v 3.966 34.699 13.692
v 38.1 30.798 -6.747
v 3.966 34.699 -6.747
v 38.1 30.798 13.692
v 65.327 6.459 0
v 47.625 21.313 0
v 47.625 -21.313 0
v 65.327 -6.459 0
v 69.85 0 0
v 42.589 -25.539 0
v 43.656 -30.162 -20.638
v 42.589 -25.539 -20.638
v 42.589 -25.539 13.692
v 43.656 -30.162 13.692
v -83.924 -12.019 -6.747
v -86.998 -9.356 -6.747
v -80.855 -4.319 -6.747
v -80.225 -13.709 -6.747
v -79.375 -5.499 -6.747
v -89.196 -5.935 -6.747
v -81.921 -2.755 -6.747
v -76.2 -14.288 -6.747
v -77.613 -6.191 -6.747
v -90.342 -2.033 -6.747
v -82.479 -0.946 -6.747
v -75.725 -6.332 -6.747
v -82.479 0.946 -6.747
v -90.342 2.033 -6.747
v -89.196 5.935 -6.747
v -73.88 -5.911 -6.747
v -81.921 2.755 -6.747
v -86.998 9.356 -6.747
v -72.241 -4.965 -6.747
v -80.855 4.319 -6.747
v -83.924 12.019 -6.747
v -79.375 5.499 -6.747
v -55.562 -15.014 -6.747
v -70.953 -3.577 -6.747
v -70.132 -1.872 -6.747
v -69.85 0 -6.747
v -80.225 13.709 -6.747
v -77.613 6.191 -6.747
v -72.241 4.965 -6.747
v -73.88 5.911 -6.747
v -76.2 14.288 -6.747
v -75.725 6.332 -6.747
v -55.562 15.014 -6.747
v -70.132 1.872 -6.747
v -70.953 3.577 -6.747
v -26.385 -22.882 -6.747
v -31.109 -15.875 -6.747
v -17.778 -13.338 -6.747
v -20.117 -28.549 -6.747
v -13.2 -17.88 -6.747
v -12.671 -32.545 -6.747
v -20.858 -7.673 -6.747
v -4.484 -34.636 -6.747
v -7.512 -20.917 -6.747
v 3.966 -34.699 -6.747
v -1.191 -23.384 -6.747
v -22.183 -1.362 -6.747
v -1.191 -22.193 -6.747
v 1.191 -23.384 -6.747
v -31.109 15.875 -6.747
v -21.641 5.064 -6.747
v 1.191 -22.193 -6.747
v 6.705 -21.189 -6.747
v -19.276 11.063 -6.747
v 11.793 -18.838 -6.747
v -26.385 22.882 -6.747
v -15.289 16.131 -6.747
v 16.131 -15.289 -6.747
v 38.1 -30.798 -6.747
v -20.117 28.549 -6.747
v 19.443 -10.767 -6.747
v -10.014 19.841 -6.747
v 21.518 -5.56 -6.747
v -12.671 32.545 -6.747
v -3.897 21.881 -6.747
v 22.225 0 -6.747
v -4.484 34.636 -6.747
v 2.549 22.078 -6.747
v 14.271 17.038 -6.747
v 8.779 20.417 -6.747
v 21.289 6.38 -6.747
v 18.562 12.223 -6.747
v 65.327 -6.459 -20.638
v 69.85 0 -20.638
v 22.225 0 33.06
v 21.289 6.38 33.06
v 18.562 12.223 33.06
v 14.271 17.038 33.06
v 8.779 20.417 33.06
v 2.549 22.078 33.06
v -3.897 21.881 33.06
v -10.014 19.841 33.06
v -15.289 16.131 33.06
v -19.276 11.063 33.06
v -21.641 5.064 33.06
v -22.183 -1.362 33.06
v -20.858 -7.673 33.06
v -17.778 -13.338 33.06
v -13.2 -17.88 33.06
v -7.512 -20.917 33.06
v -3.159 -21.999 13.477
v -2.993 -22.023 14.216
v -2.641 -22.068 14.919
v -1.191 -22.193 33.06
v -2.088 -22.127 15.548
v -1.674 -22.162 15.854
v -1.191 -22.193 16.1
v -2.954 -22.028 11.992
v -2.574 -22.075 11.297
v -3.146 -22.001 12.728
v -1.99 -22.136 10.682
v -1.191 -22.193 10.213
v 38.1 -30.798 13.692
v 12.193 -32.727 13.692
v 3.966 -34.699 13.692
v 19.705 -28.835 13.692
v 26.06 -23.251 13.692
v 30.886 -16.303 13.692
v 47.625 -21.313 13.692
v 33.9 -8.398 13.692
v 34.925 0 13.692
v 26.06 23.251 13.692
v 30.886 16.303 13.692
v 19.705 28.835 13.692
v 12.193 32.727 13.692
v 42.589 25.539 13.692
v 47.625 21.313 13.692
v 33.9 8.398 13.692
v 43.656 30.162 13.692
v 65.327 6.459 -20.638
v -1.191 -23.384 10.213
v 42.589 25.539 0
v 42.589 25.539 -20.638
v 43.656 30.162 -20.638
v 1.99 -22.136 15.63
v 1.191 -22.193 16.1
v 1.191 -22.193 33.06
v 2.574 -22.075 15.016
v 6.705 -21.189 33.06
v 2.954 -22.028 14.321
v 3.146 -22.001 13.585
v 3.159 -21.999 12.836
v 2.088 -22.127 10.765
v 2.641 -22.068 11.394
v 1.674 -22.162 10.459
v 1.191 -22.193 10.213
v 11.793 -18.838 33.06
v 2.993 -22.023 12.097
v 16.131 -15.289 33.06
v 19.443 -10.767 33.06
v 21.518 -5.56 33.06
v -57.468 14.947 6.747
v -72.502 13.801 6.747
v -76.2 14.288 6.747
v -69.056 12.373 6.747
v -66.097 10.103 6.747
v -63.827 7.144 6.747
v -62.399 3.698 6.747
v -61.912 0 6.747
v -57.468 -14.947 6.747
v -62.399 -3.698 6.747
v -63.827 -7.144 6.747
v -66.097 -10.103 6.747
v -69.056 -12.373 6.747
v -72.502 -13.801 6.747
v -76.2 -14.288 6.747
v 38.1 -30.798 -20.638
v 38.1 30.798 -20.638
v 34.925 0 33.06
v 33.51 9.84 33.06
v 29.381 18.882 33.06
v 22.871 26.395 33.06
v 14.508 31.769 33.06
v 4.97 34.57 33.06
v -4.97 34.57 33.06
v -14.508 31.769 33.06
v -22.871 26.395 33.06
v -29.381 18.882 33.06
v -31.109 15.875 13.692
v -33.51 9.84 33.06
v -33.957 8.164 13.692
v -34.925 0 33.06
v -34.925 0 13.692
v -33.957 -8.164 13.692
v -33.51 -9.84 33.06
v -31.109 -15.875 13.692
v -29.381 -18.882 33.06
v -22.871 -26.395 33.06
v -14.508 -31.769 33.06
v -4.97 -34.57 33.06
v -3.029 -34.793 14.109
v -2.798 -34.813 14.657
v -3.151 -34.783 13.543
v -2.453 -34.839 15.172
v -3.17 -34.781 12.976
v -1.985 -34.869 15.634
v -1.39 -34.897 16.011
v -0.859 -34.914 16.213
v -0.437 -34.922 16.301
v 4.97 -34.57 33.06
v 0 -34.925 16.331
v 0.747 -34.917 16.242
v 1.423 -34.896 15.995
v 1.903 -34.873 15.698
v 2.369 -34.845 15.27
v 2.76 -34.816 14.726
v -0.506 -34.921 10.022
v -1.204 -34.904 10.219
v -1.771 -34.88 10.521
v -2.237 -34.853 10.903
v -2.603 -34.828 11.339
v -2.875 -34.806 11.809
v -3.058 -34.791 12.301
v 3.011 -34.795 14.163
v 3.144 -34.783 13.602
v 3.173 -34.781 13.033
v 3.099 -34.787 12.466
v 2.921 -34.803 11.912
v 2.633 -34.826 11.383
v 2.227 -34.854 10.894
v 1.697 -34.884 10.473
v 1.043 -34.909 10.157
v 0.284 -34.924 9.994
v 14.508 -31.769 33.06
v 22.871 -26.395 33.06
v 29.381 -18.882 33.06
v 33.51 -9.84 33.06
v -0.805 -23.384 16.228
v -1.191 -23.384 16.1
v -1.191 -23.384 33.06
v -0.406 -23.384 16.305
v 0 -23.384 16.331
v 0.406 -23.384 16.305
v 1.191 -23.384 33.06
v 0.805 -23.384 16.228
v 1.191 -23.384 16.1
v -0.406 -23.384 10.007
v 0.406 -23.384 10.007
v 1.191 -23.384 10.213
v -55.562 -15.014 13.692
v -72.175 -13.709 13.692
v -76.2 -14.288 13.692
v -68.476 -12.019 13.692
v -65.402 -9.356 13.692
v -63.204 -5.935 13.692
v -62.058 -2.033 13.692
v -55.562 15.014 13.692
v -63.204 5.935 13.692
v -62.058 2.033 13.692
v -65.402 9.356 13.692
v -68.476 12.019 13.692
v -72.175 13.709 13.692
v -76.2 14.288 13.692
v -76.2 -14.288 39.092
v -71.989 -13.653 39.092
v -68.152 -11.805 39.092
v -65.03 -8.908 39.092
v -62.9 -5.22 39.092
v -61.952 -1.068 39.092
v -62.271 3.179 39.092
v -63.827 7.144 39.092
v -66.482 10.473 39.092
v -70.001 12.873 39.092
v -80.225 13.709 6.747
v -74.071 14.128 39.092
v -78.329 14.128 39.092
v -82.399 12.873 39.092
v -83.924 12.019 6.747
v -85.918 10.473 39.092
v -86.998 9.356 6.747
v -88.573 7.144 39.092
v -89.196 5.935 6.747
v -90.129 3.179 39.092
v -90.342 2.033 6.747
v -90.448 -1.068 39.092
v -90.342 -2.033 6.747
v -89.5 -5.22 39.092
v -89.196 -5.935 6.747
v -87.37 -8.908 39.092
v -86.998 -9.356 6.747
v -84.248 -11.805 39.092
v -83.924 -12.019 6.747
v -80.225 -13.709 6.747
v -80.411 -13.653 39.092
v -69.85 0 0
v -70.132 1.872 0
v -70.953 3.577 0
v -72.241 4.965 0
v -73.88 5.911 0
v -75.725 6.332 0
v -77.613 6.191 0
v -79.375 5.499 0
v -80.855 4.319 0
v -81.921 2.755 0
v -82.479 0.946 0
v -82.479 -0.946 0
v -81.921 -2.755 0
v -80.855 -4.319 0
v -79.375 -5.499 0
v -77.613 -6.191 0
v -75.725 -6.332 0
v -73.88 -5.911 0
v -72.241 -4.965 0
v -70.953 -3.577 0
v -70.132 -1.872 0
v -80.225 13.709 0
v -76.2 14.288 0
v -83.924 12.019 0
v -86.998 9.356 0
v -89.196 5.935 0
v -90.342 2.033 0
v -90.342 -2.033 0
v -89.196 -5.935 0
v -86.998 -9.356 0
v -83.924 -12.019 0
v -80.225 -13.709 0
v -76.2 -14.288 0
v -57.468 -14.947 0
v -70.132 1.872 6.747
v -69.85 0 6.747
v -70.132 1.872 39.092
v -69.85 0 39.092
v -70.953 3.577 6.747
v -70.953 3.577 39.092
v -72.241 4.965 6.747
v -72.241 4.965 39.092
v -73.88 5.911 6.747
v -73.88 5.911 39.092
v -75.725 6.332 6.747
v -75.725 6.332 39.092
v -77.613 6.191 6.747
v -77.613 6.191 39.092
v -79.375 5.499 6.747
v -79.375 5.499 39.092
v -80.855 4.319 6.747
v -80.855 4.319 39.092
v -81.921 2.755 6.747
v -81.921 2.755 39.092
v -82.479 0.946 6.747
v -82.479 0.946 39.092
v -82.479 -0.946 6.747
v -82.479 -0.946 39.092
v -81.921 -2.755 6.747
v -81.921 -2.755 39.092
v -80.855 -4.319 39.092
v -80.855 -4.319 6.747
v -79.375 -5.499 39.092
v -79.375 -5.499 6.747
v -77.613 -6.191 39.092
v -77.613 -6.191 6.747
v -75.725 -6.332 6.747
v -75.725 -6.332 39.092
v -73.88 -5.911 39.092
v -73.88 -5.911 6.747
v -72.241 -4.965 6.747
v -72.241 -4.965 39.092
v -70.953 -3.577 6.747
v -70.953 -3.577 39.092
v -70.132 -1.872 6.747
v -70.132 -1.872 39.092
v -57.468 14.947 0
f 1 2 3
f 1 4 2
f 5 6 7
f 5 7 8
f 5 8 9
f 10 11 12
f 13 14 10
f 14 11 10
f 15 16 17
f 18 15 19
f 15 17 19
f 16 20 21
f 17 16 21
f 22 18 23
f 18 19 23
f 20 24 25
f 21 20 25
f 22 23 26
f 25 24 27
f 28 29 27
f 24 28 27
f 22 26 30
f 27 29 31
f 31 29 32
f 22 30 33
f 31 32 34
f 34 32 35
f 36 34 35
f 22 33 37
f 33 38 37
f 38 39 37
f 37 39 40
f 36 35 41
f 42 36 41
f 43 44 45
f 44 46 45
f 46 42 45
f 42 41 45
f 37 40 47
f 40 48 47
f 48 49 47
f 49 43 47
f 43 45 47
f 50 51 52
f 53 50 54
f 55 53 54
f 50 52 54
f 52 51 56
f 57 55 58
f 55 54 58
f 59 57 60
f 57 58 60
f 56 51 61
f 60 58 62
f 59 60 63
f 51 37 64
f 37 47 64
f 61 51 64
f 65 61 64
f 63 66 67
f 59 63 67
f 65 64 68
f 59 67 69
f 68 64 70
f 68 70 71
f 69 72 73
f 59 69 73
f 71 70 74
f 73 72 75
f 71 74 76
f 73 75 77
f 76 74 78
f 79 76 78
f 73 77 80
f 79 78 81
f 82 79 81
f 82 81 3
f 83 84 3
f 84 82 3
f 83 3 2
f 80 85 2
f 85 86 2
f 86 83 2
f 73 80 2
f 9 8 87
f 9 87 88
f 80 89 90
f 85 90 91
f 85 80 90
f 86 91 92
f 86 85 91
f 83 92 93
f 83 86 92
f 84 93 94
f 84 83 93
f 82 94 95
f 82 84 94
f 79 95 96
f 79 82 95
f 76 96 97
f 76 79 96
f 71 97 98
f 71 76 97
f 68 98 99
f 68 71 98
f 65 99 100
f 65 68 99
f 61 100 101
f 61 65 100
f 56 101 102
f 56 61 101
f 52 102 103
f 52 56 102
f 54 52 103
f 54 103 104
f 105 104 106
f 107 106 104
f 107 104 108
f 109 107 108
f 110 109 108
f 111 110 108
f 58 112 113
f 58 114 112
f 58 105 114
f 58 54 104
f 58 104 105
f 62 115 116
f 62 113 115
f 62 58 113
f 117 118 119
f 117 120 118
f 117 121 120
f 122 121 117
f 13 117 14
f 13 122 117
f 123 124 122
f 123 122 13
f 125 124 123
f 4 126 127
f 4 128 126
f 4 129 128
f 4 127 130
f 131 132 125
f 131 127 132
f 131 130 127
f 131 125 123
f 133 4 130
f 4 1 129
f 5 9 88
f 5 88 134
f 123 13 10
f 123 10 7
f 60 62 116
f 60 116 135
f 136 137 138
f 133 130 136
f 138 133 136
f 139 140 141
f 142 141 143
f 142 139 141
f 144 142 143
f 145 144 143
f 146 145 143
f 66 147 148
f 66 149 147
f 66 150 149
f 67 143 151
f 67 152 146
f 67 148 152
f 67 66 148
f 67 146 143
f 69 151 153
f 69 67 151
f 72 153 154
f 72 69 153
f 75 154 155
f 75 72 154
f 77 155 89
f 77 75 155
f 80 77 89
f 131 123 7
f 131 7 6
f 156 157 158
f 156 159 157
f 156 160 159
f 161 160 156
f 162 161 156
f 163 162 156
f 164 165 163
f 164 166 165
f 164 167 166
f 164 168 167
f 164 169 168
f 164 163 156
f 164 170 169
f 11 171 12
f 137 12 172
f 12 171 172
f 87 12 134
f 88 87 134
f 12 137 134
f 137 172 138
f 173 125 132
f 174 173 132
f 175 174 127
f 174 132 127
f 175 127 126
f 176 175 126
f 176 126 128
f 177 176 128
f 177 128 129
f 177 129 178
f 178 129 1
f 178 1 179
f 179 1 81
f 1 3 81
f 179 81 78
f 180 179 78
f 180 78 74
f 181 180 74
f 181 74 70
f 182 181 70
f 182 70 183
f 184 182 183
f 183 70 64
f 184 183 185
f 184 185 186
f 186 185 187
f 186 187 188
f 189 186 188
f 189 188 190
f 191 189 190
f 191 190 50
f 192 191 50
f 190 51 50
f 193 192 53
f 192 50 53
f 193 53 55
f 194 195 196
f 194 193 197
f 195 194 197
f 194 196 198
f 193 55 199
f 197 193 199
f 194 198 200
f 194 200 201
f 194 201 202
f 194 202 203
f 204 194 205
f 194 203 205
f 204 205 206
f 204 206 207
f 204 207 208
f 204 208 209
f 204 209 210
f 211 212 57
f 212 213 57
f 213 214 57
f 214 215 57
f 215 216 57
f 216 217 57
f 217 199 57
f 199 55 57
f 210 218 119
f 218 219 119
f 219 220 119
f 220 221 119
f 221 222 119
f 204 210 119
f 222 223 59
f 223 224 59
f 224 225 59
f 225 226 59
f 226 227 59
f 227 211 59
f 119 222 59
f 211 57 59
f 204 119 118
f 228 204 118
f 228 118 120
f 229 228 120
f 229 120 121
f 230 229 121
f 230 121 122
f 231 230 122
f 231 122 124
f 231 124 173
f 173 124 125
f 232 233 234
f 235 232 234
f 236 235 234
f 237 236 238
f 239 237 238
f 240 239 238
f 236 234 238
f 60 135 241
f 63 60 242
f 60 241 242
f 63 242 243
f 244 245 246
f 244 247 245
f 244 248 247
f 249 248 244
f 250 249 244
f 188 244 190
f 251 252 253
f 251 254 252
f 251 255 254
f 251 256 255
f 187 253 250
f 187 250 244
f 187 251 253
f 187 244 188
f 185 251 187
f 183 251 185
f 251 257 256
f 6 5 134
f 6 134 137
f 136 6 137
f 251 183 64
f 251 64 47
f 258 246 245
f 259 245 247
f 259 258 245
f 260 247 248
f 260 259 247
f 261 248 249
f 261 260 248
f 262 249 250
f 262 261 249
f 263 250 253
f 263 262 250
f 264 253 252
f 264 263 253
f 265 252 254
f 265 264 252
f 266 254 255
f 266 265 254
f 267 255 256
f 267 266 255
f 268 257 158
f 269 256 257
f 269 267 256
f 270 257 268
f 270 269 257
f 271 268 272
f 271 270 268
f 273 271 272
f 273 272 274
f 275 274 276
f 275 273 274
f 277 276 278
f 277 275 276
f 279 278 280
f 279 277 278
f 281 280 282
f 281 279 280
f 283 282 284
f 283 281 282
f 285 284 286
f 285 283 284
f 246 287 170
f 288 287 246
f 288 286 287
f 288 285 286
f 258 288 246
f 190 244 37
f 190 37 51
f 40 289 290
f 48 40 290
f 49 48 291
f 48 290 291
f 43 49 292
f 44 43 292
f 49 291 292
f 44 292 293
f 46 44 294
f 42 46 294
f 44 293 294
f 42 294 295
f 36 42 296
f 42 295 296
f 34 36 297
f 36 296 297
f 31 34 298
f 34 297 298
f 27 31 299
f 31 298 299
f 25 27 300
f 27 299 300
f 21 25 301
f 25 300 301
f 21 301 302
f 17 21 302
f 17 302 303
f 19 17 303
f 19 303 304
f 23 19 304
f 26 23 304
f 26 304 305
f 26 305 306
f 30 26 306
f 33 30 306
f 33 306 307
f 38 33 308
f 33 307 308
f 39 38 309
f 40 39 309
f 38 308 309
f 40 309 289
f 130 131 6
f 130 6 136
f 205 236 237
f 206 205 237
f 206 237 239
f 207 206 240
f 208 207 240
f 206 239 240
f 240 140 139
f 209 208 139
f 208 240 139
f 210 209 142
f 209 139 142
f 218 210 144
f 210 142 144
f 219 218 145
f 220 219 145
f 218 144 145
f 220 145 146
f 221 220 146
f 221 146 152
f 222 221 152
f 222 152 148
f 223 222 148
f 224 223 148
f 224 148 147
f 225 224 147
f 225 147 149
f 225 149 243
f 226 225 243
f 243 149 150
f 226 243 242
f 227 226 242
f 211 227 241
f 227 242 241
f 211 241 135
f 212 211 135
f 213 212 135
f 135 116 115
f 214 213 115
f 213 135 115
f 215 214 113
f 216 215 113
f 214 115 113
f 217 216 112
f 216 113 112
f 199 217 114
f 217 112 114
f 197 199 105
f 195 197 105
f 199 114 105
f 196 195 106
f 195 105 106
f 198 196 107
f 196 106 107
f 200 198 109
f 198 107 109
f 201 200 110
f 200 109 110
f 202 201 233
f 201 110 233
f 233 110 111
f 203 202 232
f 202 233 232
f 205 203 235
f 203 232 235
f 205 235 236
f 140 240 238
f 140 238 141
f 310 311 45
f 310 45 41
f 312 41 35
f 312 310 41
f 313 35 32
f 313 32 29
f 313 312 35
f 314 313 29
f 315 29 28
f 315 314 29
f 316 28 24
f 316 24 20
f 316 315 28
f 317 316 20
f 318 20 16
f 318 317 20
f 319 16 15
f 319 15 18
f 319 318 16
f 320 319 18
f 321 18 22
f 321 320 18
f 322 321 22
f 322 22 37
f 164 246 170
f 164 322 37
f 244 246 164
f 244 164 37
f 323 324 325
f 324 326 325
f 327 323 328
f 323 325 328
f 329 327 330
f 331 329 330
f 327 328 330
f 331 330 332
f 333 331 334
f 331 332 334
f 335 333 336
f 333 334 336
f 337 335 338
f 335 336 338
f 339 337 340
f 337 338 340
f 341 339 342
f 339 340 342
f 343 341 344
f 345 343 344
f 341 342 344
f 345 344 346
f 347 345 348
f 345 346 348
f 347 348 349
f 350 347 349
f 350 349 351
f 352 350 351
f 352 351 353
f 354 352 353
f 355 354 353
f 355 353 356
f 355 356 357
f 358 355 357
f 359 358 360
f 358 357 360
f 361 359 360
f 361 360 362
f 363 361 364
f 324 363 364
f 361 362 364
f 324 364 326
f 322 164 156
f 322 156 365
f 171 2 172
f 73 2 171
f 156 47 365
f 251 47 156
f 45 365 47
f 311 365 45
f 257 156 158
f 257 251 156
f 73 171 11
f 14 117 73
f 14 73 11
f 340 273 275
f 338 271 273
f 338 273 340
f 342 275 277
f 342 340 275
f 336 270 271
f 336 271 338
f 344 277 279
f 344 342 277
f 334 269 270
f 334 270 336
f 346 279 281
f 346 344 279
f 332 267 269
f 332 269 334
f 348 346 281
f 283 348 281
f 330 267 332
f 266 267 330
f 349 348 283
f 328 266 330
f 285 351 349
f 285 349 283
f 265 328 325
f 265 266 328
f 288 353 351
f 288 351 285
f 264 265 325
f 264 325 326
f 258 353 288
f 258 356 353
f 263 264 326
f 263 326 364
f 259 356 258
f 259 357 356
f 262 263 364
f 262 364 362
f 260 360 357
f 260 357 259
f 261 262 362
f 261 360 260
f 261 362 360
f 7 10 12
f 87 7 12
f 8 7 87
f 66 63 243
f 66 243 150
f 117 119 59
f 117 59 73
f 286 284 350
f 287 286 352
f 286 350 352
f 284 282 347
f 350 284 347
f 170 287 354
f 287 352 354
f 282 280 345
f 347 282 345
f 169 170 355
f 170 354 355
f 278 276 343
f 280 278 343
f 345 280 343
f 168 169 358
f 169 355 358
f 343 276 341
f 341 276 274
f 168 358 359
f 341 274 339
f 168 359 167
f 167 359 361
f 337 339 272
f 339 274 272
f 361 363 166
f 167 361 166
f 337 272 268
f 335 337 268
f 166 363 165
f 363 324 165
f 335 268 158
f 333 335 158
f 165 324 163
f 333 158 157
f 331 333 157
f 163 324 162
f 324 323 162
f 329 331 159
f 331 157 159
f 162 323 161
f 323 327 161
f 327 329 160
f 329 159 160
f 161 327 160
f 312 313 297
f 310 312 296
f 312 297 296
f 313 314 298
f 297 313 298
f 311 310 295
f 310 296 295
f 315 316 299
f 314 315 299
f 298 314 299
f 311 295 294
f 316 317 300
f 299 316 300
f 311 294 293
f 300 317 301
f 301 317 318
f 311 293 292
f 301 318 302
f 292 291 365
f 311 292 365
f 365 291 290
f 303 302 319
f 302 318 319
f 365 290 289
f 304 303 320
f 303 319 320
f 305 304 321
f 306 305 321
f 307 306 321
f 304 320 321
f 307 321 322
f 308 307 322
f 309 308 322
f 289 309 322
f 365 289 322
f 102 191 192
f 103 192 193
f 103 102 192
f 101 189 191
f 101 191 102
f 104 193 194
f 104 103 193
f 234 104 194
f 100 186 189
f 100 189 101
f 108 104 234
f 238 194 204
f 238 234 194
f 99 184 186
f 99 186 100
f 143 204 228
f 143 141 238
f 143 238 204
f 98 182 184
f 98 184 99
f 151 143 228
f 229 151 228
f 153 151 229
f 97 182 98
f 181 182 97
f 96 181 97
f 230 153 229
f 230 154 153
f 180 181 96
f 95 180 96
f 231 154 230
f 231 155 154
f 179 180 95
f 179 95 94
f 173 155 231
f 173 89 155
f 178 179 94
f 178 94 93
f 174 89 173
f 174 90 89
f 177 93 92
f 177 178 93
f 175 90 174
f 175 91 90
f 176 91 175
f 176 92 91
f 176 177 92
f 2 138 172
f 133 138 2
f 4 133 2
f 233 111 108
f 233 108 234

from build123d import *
from OCP.BRepAlgoAPI import BRepAlgoAPI_Cut
from OCP.TopTools import TopTools_ListOfShape

# Parameters (mm, degrees)
BOSS_EXTRUDE7_DEPTH     = 20.6375
SKETCH1_18_R            = 14.2875
SKETCH1_18_R_2          = 6.35
SKETCH1_18_R_3          = 34.925
SKETCH1_18_R_4          = 22.225
BOSS_EXTRUDE10_DEPTH    = 6.746875
BOSS_EXTRUDE11_START    = 6.746875
SKETCH1_20_R            = 34.925
SKETCH1_20_R_2          = 22.225
BOSS_EXTRUDE11_DEPTH    = 6.746875
BOSS_EXTRUDE12_START    = 13.692187
SKETCH1_21_R            = 14.2875
SKETCH1_21_R_2          = 6.35
SKETCH1_21_R_3          = 34.925
SKETCH1_21_R_4          = 22.225
BOSS_EXTRUDE12_DEPTH    = 6.945312
BOSS_EXTRUDE13_START    = 39.09219
SKETCH1_22_R            = 14.2875
SKETCH1_22_R_2          = 6.35
BOSS_EXTRUDE13_DEPTH    = 25.4
BOSS_EXTRUDE14_START    = 13.692187
SKETCH1_23_R            = 34.925
SKETCH1_23_R_2          = 22.225
BOSS_EXTRUDE14_DEPTH    = 19.367501
CUT_EXTRUDE3_DEPTH      = 111.865374
SKETCH5_R               = 3.175
CUT_EXTRUDE4_DEPTH      = 105.575057
CUT_EXTRUDE5_DEPTH      = 105.575057
CUT_EXTRUDE5_DEPTH_BACK = 105.575057
SKETCH6_W               = 33.02
SKETCH6_H               = 6.746875


with BuildPart() as part:
    # Sketch1 → Boss-Extrude7 (new body)
    with BuildSketch(Plane.XY):
        Polygon((38.1, 30.797578), (38.1, -30.797578), (43.65625, -30.1625), (42.588827, -25.538982), (65.327211, -6.459212), (69.85, 0), (65.327211, 6.459212), (42.588827, 25.538982), (43.65625, 30.1625), align=None)
    extrude(amount=-BOSS_EXTRUDE7_DEPTH)

    # Sketch1<18> → Boss-Extrude10 (add)
    # profile 1 of 5: a face of its own
    with BuildSketch(Plane.XY):
        with BuildLine():
            ThreePointArc((34.925, 0), (26.060233, -23.251234), (3.966094, -34.699074))
            Line((3.966094, -34.699074), (38.1, -30.797578))
            Line((38.1, -30.797578), (38.1, 30.797578))
            Line((38.1, 30.797578), (3.966094, 34.699074))
            ThreePointArc((3.966094, 34.699074), (26.060233, 23.251234), (34.925, 0))
        make_face()
    # profile 2 of 5: a face of its own
    with BuildSketch(Plane.XY):
        with BuildLine():
            Line((-55.5625, 15.014068), (-55.5625, -15.014068))
            Line((-55.5625, -15.014068), (-31.10852, -15.875))
            ThreePointArc((-31.10852, -15.875), (-34.925, 0), (-31.10852, 15.875))
            Line((-31.10852, 15.875), (-55.5625, 15.014068))
        make_face()
    # profile 3 of 5: a face of its own
    with BuildSketch(Plane.XY):
        with BuildLine():
            ThreePointArc((-61.9125, 0), (-66.097212, -10.102788), (-76.2, -14.2875))
            Line((-76.2, -14.2875), (-55.5625, -15.014068))
            Line((-55.5625, -15.014068), (-55.5625, 15.014068))
            Line((-55.5625, 15.014068), (-76.2, 14.2875))
            ThreePointArc((-76.2, 14.2875), (-66.097212, 10.102788), (-61.9125, 0))
        make_face()
    # profile 4 of 5: a face of its own
    with BuildSketch(Plane.XY):
        with Locations((-76.2, 0)):
            Circle(SKETCH1_18_R)
        with Locations((-76.2, 0)):
            Circle(SKETCH1_18_R_2, mode=Mode.SUBTRACT)
    # profile 5 of 5: a face of its own
    with BuildSketch(Plane.XY):
        Circle(SKETCH1_18_R_3)
        Circle(SKETCH1_18_R_4, mode=Mode.SUBTRACT)
    extrude(amount=-BOSS_EXTRUDE10_DEPTH)

    # Sketch1<20> → Boss-Extrude11 (add)
    # profile 1 of 5: a face of its own
    with BuildSketch(Plane.XY.offset(BOSS_EXTRUDE11_START)):
        Circle(SKETCH1_20_R)
        Circle(SKETCH1_20_R_2, mode=Mode.SUBTRACT)
    # profile 2 of 5: a face of its own
    with BuildSketch(Plane.XY.offset(BOSS_EXTRUDE11_START)):
        with BuildLine():
            ThreePointArc((34.925, 0), (26.060233, -23.251234), (3.966094, -34.699074))
            Line((3.966094, -34.699074), (38.1, -30.797578))
            Line((38.1, -30.797578), (38.1, 30.797578))
            Line((38.1, 30.797578), (3.966094, 34.699074))
            ThreePointArc((3.966094, 34.699074), (26.060233, 23.251234), (34.925, 0))
        make_face()
    # profile 3 of 5: a face of its own
    with BuildSketch(Plane.XY.offset(BOSS_EXTRUDE11_START)):
        Polygon((38.1, 30.797578), (38.1, -30.797578), (43.65625, -30.1625), (42.588827, -25.538982), (47.625, -21.313131), (47.625, 21.313131), (42.588827, 25.538982), (43.65625, 30.1625), align=None)
    # profile 4 of 5: a face of its own
    with BuildSketch(Plane.XY.offset(BOSS_EXTRUDE11_START)):
        with BuildLine():
            Line((-55.5625, 15.014068), (-55.5625, -15.014068))
            Line((-55.5625, -15.014068), (-31.10852, -15.875))
            ThreePointArc((-31.10852, -15.875), (-34.925, 0), (-31.10852, 15.875))
            Line((-31.10852, 15.875), (-55.5625, 15.014068))
        make_face()
    # profile 5 of 5: a face of its own
    with BuildSketch(Plane.XY.offset(BOSS_EXTRUDE11_START)):
        with BuildLine():
            ThreePointArc((-61.9125, 0), (-66.097212, -10.102788), (-76.2, -14.2875))
            Line((-76.2, -14.2875), (-55.5625, -15.014068))
            Line((-55.5625, -15.014068), (-55.5625, 15.014068))
            Line((-55.5625, 15.014068), (-76.2, 14.2875))
            ThreePointArc((-76.2, 14.2875), (-66.097212, 10.102788), (-61.9125, 0))
        make_face()
    extrude(amount=-BOSS_EXTRUDE11_DEPTH)

    # Sketch1<21> → Boss-Extrude12 (add)
    # profile 1 of 6: a face of its own
    with BuildSketch(Plane.XY.offset(BOSS_EXTRUDE12_START)):
        with Locations((-76.2, 0)):
            Circle(SKETCH1_21_R)
        with Locations((-76.2, 0)):
            Circle(SKETCH1_21_R_2, mode=Mode.SUBTRACT)
    # profile 2 of 6: a face of its own
    with BuildSketch(Plane.XY.offset(BOSS_EXTRUDE12_START)):
        with BuildLine():
            ThreePointArc((-61.9125, 0), (-66.097212, -10.102788), (-76.2, -14.2875))
            Line((-76.2, -14.2875), (-55.5625, -15.014068))
            Line((-55.5625, -15.014068), (-55.5625, 15.014068))
            Line((-55.5625, 15.014068), (-76.2, 14.2875))
            ThreePointArc((-76.2, 14.2875), (-66.097212, 10.102788), (-61.9125, 0))
        make_face()
    # profile 3 of 6: a face of its own
    with BuildSketch(Plane.XY.offset(BOSS_EXTRUDE12_START)):
        with BuildLine():
            Line((-55.5625, 15.014068), (-55.5625, -15.014068))
            Line((-55.5625, -15.014068), (-31.10852, -15.875))
            ThreePointArc((-31.10852, -15.875), (-34.925, 0), (-31.10852, 15.875))
            Line((-31.10852, 15.875), (-55.5625, 15.014068))
        make_face()
    # profile 4 of 6: a face of its own
    with BuildSketch(Plane.XY.offset(BOSS_EXTRUDE12_START)):
        Circle(SKETCH1_21_R_3)
        Circle(SKETCH1_21_R_4, mode=Mode.SUBTRACT)
    # profile 5 of 6: a face of its own
    with BuildSketch(Plane.XY.offset(BOSS_EXTRUDE12_START)):
        with BuildLine():
            ThreePointArc((34.925, 0), (26.060233, -23.251234), (3.966094, -34.699074))
            Line((3.966094, -34.699074), (38.1, -30.797578))
            Line((38.1, -30.797578), (38.1, 30.797578))
            Line((38.1, 30.797578), (3.966094, 34.699074))
            ThreePointArc((3.966094, 34.699074), (26.060233, 23.251234), (34.925, 0))
        make_face()
    # profile 6 of 6: a face of its own
    with BuildSketch(Plane.XY.offset(BOSS_EXTRUDE12_START)):
        Polygon((38.1, 30.797578), (38.1, -30.797578), (43.65625, -30.1625), (42.588827, -25.538982), (47.625, -21.313131), (47.625, 21.313131), (42.588827, 25.538982), (43.65625, 30.1625), align=None)
    extrude(amount=-BOSS_EXTRUDE12_DEPTH)


with BuildPart() as boss_extrude13_tool:
    # Sketch1<22> → Boss-Extrude13 (new body)
    with BuildSketch(Plane.XY.offset(BOSS_EXTRUDE13_START)):
        with Locations(Location((-76.2, 0, 0), (0, 0, 270))):
            Circle(SKETCH1_22_R)
        with Locations((-76.2, 0)):
            Circle(SKETCH1_22_R_2, mode=Mode.SUBTRACT)
    extrude(amount=-BOSS_EXTRUDE13_DEPTH)


with BuildPart() as part_1:
    add(part.part)


with BuildPart() as part_2:
    # Boss-Extrude13: joined with boss_extrude13_tool
    add(part_1.part.fuse(boss_extrude13_tool.part, tol=0.00001))

    # Sketch1<23> → Boss-Extrude14 (add)
    with BuildSketch(Plane.XY.offset(BOSS_EXTRUDE14_START)):
        Circle(SKETCH1_23_R)
        Circle(SKETCH1_23_R_2, mode=Mode.SUBTRACT)
    extrude(amount=BOSS_EXTRUDE14_DEPTH)


with BuildPart() as cut_extrude3_tool:
    # Sketch4 → Cut-Extrude3 (new, through all)
    with BuildSketch(Plane.XY.offset(33.059687)):
        with BuildLine():
            Line((0, -23.38371), (0, -22.225))
            ThreePointArc((0, -22.225), (-0.595526, -22.21702), (-1.190625, -22.193085))
            Line((-1.190625, -22.193085), (-1.190625, -23.38371))
            Line((-1.190625, -23.38371), (0, -23.38371))
        make_face()
        with BuildLine():
            ThreePointArc((1.190625, -22.193085), (0.595526, -22.21702), (0, -22.225))
            Line((0, -22.225), (0, -23.38371))
            Line((0, -23.38371), (1.190625, -23.38371))
            Line((1.190625, -23.38371), (1.190625, -22.193085))
        make_face()
    extrude(amount=-CUT_EXTRUDE3_DEPTH)


with BuildPart() as part_3:
    add(part_2.part)

    # Cut-Extrude3: cut by cut_extrude3_tool, with a tolerance
    cut_extrude3_stock = TopTools_ListOfShape()
    cut_extrude3_stock.Append(part_3.part.wrapped)
    cut_extrude3_tools = TopTools_ListOfShape()
    cut_extrude3_tools.Append(cut_extrude3_tool.part.wrapped)
    cut_extrude3_cut = BRepAlgoAPI_Cut()
    cut_extrude3_cut.SetArguments(cut_extrude3_stock)
    cut_extrude3_cut.SetTools(cut_extrude3_tools)
    cut_extrude3_cut.SetFuzzyValue(0.00001)
    cut_extrude3_cut.Build()
    add(Compound.cast(cut_extrude3_cut.Shape()).solids(), mode=Mode.REPLACE)

    # Sketch5 → Cut-Extrude4 (cut, through all)
    with BuildSketch(Plane(origin=(0, 0, 0), x_dir=(1, 0, 0), z_dir=(0, 1, 0))):
        with Locations(Location((0, -13.156406, 0), (0, 0, 270))):
            Circle(SKETCH5_R)
    extrude(amount=-CUT_EXTRUDE4_DEPTH, mode=Mode.SUBTRACT)

    # Sketch6 → Cut-Extrude5 (cut, two sides: drawn at the far end of the back side and taken through both)
    with BuildSketch(Plane(origin=(0, 0, 0), x_dir=(1, 0, 0), z_dir=(0, 1, 0)).offset(-CUT_EXTRUDE5_DEPTH_BACK)):
        with Locations((-73.9775, -3.373437)):
            Rectangle(SKETCH6_W, SKETCH6_H)
    extrude(amount=CUT_EXTRUDE5_DEPTH + CUT_EXTRUDE5_DEPTH_BACK, mode=Mode.SUBTRACT)


solid = part_3.part
